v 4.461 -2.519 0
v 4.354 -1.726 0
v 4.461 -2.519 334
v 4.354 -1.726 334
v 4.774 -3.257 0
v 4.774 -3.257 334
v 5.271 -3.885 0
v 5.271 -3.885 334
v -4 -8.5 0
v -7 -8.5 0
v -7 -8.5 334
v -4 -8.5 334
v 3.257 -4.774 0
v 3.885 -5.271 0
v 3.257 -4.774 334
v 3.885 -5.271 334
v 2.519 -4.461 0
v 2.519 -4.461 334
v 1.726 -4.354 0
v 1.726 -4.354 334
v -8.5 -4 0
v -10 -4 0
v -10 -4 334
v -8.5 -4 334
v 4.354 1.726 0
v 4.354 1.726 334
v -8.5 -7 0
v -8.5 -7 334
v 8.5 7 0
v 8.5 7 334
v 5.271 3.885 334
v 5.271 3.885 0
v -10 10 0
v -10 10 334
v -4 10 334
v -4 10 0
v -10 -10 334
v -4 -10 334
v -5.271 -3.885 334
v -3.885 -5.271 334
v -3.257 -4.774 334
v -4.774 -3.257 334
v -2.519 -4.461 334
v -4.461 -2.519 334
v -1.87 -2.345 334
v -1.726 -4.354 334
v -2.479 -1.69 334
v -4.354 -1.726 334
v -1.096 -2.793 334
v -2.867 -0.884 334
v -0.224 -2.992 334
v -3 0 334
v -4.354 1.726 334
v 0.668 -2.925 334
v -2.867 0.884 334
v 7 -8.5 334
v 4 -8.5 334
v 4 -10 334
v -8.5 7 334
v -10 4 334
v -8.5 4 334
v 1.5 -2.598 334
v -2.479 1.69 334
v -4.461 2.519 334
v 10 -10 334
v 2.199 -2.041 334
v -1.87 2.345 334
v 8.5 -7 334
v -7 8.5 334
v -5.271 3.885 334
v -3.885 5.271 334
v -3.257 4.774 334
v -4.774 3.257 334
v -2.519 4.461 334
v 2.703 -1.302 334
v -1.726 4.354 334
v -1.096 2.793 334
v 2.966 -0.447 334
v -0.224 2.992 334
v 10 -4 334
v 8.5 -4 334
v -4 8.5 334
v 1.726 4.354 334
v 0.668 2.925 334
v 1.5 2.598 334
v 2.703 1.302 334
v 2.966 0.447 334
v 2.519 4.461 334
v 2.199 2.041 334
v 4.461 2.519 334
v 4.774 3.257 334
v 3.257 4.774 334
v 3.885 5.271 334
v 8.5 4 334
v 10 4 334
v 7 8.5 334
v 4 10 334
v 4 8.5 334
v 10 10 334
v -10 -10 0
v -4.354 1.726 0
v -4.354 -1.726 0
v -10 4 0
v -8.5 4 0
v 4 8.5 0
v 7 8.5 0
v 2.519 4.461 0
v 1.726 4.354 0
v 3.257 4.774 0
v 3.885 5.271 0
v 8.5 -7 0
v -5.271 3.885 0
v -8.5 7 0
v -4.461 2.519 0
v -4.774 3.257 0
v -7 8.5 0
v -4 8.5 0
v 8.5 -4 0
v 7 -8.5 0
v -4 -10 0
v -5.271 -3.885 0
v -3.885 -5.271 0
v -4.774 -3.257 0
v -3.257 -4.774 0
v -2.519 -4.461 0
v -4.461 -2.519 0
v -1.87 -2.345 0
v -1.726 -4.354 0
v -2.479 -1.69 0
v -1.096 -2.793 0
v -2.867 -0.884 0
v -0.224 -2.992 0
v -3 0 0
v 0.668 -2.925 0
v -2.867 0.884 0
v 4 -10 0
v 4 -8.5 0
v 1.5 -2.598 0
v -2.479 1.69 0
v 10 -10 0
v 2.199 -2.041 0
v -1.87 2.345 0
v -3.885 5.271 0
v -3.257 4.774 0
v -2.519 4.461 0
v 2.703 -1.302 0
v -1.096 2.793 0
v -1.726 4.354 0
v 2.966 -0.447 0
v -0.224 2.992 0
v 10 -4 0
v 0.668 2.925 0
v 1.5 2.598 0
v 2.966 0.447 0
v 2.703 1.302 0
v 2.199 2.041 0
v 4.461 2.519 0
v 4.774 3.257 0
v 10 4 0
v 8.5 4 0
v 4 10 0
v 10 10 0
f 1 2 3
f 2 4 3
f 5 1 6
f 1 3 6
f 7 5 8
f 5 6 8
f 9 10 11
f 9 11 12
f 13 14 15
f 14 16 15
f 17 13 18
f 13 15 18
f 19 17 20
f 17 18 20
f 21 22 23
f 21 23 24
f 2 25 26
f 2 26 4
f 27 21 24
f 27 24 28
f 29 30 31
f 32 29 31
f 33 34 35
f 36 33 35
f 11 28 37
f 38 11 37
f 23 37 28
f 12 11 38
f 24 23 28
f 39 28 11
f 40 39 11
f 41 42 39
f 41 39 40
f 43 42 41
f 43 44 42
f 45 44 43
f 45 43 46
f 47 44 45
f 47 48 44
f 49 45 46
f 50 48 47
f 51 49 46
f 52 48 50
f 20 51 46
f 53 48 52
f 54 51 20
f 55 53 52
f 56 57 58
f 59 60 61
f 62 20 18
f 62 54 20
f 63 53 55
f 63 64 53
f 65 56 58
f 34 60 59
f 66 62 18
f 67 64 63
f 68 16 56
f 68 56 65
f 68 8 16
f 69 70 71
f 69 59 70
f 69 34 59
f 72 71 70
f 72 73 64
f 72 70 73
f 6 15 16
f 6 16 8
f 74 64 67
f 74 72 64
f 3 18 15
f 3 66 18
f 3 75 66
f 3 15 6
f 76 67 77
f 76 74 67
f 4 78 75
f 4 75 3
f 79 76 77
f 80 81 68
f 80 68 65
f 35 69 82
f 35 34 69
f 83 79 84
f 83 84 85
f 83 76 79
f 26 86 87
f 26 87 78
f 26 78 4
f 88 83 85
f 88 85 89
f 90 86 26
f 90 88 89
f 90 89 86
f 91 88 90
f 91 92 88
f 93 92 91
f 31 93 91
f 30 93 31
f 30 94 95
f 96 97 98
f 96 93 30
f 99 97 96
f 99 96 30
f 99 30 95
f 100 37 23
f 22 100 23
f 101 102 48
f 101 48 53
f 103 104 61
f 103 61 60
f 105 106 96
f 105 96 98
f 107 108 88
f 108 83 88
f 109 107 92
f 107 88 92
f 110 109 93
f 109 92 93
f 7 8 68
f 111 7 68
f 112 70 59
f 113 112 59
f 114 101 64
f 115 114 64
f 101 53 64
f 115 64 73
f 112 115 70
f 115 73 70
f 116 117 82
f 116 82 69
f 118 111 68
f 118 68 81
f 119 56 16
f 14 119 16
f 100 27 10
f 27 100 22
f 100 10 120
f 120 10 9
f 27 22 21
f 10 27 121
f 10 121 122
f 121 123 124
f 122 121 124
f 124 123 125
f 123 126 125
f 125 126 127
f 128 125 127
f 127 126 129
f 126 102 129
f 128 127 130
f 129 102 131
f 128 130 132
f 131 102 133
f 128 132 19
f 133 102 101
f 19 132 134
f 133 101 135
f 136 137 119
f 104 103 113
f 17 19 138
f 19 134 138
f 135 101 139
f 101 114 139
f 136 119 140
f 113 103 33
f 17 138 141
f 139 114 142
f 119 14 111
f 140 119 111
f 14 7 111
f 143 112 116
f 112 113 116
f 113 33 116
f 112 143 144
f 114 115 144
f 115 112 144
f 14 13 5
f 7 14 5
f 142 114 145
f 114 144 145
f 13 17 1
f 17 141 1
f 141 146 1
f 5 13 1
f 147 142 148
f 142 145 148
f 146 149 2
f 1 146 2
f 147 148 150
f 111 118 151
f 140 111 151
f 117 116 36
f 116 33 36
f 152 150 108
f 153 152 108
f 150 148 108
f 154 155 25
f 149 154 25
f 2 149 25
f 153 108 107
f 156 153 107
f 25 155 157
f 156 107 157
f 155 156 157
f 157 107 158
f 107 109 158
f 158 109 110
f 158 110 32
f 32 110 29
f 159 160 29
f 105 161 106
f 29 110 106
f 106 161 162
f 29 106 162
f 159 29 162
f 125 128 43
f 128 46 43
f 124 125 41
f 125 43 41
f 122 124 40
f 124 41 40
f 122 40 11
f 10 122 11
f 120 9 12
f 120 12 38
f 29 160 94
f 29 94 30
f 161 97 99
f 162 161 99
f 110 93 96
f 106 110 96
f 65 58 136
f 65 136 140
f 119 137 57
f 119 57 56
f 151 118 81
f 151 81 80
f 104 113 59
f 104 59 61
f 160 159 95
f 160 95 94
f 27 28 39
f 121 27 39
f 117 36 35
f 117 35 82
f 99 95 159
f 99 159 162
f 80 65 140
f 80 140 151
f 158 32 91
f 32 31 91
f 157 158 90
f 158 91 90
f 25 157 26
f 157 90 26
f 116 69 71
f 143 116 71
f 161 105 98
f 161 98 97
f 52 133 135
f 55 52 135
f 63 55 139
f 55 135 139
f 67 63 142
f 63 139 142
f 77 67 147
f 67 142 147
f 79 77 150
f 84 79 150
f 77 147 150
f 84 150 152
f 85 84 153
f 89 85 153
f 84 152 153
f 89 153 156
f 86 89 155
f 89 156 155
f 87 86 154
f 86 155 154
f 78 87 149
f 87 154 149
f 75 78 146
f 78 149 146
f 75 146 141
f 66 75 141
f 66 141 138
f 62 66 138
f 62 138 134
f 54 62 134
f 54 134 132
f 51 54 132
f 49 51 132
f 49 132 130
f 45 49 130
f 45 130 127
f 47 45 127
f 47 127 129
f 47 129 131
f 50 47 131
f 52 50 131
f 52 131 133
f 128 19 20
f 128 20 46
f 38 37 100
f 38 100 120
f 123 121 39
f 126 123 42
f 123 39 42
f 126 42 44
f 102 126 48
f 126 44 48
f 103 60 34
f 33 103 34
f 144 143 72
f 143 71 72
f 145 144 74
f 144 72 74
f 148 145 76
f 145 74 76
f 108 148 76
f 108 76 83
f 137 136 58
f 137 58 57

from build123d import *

# Parameters (mm, degrees)
ESBO_O1_W                  = 20
ESBO_O1_H                  = 20
RESSALTO_EXTRUS_O1_DEPTH   = 334
ESBO_O2_R                  = 3
CORTE_EXTRUS_O1_DEPTH      = 1
CORTE_EXTRUS_O1_DEPTH_BACK = 335
FILETE1_R                  = 3


with BuildPart() as part:
    # Esboço1 → Ressalto-extrusão1 (new body)
    with BuildSketch(Plane.XY):
        Rectangle(ESBO_O1_W, ESBO_O1_H)
    extrude(amount=RESSALTO_EXTRUS_O1_DEPTH)

    # Esboço2 → Corte-extrusão1 (cut, two sides)
    with BuildSketch(Plane(origin=(0, 0, 0), x_dir=(-1, 0, 0), z_dir=(0, 0, -1))) as corte_extrus_o1_sk:
        Circle(ESBO_O2_R)
        Polygon((-10, 4), (-8.5, 4), (-8.5, 7), (-4.353828188, 3), (-4.353828188, -3), (-8.5, -7), (-8.5, -4), (-10, -4), align=None)
        Polygon((4, 10), (4, 8.5), (7, 8.5), (3, 4.353828188), (-3, 4.353828188), (-7, 8.5), (-4, 8.5), (-4, 10), align=None)
        Polygon((10, -4), (8.5, -4), (8.5, -7), (4.353828188, -3), (4.353828188, 3), (8.5, 7), (8.5, 4), (10, 4), align=None)
        Polygon((-4, -10), (-4, -8.5), (-7, -8.5), (-3, -4.353828188), (3, -4.353828188), (7, -8.5), (4, -8.5), (4, -10), align=None)
    extrude(amount=CORTE_EXTRUS_O1_DEPTH, mode=Mode.SUBTRACT)
    extrude(corte_extrus_o1_sk.sketch, amount=-CORTE_EXTRUS_O1_DEPTH_BACK, mode=Mode.SUBTRACT)

    # Filete1
    filete1_edges = [part.edges().sort_by_distance(p)[0] for p in [
        (-3, 4.353828188, 167),
        (3, 4.353828188, 167),
        (4.353828188, 3, 167),
        (4.353828188, -3, 167),
        (3, -4.353828188, 167),
        (-3, -4.353828188, 167),
        (-4.353828188, -3, 167),
        (-4.353828188, 3, 167),
    ]]
    fillet(filete1_edges, radius=FILETE1_R)


solid = part.part
